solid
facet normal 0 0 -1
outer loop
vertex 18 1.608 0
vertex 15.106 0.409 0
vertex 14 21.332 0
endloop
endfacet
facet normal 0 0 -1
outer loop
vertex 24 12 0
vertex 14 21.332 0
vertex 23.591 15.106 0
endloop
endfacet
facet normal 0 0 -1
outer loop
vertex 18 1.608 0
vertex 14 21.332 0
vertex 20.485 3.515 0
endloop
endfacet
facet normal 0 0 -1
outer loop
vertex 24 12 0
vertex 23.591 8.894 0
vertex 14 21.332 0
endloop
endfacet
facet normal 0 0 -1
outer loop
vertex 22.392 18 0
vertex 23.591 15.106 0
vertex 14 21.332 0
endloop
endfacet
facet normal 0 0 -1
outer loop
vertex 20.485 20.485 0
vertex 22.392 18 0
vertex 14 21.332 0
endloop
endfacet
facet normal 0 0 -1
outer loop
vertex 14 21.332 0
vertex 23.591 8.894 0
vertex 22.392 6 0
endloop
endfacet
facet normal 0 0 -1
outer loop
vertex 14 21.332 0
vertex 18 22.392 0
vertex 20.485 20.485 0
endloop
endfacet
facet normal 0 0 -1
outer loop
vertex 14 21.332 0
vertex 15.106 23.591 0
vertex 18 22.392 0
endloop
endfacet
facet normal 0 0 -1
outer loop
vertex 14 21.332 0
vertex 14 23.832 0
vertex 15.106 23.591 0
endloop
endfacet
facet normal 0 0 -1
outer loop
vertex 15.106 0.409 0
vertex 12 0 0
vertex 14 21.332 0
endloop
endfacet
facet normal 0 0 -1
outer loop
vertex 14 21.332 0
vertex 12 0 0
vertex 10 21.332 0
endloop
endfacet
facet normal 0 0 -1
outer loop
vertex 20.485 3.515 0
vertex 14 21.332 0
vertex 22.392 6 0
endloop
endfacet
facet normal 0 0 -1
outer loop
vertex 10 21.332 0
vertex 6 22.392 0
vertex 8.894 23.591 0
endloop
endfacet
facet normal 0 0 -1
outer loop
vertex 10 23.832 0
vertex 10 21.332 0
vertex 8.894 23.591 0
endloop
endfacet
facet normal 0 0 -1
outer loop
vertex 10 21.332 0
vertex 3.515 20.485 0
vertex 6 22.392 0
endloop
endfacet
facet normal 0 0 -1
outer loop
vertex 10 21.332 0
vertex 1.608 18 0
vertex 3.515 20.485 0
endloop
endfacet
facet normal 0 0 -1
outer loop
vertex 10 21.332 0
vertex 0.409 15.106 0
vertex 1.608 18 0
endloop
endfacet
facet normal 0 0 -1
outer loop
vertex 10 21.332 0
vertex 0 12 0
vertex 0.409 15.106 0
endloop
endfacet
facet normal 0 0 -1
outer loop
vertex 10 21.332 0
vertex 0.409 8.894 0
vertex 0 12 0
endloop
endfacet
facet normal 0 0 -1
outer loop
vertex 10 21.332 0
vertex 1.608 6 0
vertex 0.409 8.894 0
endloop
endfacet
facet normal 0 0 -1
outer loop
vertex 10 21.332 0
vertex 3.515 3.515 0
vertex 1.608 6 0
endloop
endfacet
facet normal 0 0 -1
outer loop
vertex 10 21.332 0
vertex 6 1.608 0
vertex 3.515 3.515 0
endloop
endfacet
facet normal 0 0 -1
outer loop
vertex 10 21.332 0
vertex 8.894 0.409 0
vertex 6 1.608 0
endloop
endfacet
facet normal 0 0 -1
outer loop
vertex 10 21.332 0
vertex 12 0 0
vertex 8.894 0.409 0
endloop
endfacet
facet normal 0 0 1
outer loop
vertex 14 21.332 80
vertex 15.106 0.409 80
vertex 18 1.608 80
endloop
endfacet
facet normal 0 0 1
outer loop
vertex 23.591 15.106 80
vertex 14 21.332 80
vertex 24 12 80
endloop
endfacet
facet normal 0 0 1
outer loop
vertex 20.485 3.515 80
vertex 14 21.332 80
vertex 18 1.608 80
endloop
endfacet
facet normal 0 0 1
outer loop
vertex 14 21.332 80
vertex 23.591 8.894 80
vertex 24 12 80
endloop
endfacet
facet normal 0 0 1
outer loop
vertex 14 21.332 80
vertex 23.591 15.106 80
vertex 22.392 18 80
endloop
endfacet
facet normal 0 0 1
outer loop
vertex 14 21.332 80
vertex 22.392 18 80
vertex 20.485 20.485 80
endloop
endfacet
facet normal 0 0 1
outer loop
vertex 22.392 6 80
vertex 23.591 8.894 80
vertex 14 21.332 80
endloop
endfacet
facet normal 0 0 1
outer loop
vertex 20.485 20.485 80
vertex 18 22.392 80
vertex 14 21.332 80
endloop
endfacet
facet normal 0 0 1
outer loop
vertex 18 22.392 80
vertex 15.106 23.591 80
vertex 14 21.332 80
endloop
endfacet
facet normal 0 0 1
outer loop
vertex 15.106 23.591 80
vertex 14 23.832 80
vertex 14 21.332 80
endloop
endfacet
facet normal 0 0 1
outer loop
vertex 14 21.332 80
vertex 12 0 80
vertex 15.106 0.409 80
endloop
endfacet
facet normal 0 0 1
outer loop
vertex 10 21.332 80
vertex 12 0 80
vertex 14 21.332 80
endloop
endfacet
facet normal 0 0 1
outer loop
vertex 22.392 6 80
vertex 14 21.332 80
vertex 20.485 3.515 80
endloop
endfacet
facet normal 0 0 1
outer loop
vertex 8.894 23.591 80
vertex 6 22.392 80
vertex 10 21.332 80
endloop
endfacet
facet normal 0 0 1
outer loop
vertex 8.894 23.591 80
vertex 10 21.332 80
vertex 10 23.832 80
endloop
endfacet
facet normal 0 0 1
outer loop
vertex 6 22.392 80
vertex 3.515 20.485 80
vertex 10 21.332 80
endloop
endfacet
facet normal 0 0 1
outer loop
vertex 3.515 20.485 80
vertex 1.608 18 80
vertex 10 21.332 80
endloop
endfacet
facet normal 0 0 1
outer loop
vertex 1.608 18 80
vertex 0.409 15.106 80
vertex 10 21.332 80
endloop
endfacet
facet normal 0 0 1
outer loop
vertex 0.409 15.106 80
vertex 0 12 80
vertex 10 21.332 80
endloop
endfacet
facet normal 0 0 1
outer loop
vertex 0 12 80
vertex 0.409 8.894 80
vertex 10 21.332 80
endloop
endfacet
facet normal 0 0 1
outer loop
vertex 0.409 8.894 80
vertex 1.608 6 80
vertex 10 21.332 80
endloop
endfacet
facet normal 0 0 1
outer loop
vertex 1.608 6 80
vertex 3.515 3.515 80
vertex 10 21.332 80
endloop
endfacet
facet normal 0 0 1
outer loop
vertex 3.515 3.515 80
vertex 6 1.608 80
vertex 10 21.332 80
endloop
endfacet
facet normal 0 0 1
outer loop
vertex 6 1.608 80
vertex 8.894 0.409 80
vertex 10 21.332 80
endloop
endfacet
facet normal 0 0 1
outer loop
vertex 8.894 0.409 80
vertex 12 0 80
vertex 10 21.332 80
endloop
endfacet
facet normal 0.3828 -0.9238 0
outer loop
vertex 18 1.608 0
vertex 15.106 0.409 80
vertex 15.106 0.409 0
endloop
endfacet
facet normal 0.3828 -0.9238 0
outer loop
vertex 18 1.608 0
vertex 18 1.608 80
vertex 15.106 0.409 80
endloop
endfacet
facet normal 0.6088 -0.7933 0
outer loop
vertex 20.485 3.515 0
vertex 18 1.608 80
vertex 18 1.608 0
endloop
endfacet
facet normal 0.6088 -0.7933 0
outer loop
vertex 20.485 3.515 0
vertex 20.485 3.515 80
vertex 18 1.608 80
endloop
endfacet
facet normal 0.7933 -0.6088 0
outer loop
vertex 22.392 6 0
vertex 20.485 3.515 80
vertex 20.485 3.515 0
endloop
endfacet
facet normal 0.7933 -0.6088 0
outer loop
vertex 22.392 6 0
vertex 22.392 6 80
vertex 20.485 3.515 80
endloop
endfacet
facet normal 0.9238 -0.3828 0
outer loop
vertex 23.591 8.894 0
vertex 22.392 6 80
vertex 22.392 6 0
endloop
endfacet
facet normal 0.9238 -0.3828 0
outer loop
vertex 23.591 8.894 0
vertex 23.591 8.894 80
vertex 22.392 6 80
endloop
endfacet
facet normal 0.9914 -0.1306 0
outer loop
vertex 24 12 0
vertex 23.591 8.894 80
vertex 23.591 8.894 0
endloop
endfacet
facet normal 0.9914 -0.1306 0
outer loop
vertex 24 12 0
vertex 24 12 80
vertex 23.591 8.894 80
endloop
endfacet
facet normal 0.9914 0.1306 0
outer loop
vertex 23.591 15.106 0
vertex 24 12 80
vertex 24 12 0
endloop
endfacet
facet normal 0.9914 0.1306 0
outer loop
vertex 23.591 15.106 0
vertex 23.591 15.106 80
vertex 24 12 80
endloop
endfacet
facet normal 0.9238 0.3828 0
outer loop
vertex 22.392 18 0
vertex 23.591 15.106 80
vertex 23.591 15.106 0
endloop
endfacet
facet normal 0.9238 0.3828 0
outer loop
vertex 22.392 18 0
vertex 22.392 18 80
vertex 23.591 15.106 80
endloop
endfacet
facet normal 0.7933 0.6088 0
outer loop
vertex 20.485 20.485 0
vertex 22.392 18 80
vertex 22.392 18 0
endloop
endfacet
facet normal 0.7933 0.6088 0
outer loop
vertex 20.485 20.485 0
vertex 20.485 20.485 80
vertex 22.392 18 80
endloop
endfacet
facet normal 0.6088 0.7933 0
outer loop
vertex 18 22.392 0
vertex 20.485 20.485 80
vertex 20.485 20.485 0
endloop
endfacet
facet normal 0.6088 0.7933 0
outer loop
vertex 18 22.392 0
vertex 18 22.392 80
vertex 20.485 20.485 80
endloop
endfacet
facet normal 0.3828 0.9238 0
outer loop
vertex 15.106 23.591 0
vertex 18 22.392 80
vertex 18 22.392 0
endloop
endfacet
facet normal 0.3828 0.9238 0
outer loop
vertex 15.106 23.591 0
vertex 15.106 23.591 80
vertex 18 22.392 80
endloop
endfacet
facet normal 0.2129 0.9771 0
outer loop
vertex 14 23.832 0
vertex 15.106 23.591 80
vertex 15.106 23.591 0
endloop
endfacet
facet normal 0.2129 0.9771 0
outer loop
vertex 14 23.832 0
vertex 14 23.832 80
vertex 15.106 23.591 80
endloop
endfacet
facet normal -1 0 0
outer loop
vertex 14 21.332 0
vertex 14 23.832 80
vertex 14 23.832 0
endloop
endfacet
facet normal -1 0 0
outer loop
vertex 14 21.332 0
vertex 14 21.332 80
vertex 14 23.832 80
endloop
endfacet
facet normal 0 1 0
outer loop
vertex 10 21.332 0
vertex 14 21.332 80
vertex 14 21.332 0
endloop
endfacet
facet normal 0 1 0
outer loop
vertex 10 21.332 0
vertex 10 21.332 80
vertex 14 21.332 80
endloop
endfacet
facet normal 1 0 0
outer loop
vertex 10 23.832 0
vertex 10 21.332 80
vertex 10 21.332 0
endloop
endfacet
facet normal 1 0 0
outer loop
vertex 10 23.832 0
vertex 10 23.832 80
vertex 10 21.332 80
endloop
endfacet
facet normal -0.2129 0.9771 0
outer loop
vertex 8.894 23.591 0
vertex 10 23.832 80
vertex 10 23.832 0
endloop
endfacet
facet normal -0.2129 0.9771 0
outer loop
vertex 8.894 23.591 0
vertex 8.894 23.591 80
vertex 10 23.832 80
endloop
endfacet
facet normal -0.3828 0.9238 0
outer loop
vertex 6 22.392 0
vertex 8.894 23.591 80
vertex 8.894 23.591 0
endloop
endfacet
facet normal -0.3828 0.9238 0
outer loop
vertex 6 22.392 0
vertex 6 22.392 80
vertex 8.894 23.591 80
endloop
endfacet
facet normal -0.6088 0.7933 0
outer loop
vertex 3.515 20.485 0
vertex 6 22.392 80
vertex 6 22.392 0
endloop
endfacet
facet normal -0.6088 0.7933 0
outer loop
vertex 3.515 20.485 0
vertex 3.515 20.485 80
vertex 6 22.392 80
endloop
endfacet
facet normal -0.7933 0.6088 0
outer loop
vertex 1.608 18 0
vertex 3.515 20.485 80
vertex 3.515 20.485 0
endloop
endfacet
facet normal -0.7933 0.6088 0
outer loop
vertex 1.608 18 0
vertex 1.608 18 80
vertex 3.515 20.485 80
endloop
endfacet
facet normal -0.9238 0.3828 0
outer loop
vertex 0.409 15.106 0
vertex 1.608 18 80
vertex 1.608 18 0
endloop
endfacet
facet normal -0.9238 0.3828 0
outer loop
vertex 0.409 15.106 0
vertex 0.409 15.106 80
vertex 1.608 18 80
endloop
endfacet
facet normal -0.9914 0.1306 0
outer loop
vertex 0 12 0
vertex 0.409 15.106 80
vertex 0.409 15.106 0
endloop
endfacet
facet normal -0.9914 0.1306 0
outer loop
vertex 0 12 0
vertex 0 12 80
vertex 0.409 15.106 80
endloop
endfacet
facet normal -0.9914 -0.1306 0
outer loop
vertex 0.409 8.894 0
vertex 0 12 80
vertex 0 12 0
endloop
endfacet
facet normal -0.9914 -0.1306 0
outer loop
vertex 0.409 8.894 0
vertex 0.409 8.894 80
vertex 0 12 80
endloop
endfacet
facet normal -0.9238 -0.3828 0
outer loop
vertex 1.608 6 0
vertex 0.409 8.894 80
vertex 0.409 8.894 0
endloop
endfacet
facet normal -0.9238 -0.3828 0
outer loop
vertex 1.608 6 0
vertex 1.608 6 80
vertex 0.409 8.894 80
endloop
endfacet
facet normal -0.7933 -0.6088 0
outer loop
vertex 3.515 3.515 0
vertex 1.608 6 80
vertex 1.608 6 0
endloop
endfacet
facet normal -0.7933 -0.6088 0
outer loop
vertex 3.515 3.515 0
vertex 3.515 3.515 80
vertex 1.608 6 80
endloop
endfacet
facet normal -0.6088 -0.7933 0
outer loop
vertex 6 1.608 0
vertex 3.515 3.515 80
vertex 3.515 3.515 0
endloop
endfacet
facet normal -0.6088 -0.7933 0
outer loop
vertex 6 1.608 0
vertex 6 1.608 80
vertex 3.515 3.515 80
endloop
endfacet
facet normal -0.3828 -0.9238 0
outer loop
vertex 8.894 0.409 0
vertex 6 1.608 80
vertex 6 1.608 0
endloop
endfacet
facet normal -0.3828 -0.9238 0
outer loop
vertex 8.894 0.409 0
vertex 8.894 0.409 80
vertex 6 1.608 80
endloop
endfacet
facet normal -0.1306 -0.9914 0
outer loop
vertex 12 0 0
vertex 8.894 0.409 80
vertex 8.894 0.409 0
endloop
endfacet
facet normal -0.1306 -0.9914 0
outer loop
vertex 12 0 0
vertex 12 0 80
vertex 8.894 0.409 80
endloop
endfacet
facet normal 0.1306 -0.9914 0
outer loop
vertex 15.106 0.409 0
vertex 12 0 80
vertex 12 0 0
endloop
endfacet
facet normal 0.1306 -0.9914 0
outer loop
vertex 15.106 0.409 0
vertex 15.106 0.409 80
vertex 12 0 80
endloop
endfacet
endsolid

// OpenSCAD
$fn = 32;
// target_bbox: 24, 23.832, 80
// ----------------------------------------------------------------------
// Keyway shaft: d24 shaft, key 4 x 2.5 mm
// ----------------------------------------------------------------------

// --- parameters (mm) ---
shaft_r = 12;             // shaft radius
key_w = 4;                // keyway width
key_d = 2.5;              // keyway depth below the surface line
plate_t = 80;             // shaft length, Z (extrusion height)

shaft_d = 2 * shaft_r;  // shaft diameter
circle_step = 15;  // polygon sampling step, degrees

profile = [[8.894, 23.591], [6, 22.392], [3.515, 20.485], [1.608, 18], [0.409, 15.106], [0, 12], [0.409, 8.894], [1.608, 6], [3.515, 3.515], [6, 1.608], [8.894, 0.409], [12, 0], [15.106, 0.409], [18, 1.608], [20.485, 3.515], [22.392, 6], [23.591, 8.894], [24, 12], [23.591, 15.106], [22.392, 18], [20.485, 20.485], [18, 22.392], [15.106, 23.591], [14, 23.832], [14, 21.332], [10, 21.332], [10, 23.832]];  // primary outline, 27 points, counter clockwise

// --- the one profile operation ---
linear_extrude(height = plate_t) polygon(points = profile);
